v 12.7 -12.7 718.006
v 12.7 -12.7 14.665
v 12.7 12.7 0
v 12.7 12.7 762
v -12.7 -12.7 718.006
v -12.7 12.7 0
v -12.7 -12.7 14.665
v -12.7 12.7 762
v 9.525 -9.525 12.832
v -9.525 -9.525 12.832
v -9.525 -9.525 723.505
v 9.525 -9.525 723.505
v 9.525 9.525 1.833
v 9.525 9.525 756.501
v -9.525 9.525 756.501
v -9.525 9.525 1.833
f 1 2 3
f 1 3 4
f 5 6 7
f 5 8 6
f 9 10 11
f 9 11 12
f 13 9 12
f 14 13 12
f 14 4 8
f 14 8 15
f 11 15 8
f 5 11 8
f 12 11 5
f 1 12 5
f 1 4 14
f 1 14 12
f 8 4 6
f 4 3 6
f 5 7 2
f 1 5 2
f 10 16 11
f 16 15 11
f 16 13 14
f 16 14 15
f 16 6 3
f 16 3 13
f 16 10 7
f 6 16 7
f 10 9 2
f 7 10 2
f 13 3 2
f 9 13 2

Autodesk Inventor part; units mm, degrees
ref_plane "YZ Plane" through (0, 0, 0) normal (1, 0, 0) x (0, 1, 0)
ref_plane "XZ Plane" through (0, 0, 0) normal (0, 1, 0) x (-1, 0, 0)
ref_plane "XY Plane" through (0, 0, 0) normal (0, 0, 1) x (1, 0, 0)
sketch "Sketch1" plane through (0, 0, 0) normal (0, 0, 1) x (1, 0, 0)
  line L0 (-12.7, -12.7) -> (12.7, -12.7)
  line L1 (12.7, -12.7) -> (12.7, 12.7)
  line L2 (12.7, 12.7) -> (-12.7, 12.7)
  line L3 (-12.7, 12.7) -> (-12.7, -12.7)
  line L4 (-12.7, -12.7) -> (12.7, 12.7) construction
  line L5 (12.7, -12.7) -> (-12.7, 12.7) construction
  line L6 (-9.525, -9.525) -> (9.525, -9.525)
  line L7 (9.525, -9.525) -> (9.525, 9.525)
  line L8 (9.525, 9.525) -> (-9.525, 9.525)
  line L9 (-9.525, 9.525) -> (-9.525, -9.525)
  line L10 (-9.525, -9.525) -> (9.525, 9.525) construction
  line L11 (9.525, -9.525) -> (-9.525, 9.525) construction
  point P0 (0, 0)
  dimension "d0" = 25.4
  dimension "d1" = 25.4
  dimension "d2" = 3.175
extrude "Extrusion1" add sketch "Sketch1" along normal blind 762
sketch "Sketch2" plane through (12.7, -12.7, 0) normal (1, 0, 0) x (0, 0, -1)
  line L0 (0, 0) -> (0, 25.4) projected
  line L1 (0, 25.4) -> (-14.6647, 0)
  line L2 (0, 0) -> (-762, 0) projected
  line L3 (0, 0) -> (0, 25.4)
  line L4 (-14.6647, 0) -> (0, 0)
  point P0 (0, 12.7)
  dimension "d10" = 60
extrude "Extrusion2" cut sketch "Sketch2" against normal through all
sketch "Sketch3" plane through (12.7, -12.7, 762) normal (1, 0, 0) x (0, 0, -1)
  line L0 (762, 25.4) -> (0, 25.4) projected
  line L1 (0, 25.4) -> (43.9941, 0)
  line L2 (747.3353, 0) -> (0, 0) projected
  line L3 (0, 0) -> (0, 25.4)
  line L4 (0, 3.175) -> (0, 22.225) projected
  line L5 (43.9941, 0) -> (0, 0)
  point P0 (762, 12.7)
  dimension "d7" = 30
extrude "Extrusion3" cut sketch "Sketch3" against normal through all
properties part number "hypotAluminumExtrusion"
